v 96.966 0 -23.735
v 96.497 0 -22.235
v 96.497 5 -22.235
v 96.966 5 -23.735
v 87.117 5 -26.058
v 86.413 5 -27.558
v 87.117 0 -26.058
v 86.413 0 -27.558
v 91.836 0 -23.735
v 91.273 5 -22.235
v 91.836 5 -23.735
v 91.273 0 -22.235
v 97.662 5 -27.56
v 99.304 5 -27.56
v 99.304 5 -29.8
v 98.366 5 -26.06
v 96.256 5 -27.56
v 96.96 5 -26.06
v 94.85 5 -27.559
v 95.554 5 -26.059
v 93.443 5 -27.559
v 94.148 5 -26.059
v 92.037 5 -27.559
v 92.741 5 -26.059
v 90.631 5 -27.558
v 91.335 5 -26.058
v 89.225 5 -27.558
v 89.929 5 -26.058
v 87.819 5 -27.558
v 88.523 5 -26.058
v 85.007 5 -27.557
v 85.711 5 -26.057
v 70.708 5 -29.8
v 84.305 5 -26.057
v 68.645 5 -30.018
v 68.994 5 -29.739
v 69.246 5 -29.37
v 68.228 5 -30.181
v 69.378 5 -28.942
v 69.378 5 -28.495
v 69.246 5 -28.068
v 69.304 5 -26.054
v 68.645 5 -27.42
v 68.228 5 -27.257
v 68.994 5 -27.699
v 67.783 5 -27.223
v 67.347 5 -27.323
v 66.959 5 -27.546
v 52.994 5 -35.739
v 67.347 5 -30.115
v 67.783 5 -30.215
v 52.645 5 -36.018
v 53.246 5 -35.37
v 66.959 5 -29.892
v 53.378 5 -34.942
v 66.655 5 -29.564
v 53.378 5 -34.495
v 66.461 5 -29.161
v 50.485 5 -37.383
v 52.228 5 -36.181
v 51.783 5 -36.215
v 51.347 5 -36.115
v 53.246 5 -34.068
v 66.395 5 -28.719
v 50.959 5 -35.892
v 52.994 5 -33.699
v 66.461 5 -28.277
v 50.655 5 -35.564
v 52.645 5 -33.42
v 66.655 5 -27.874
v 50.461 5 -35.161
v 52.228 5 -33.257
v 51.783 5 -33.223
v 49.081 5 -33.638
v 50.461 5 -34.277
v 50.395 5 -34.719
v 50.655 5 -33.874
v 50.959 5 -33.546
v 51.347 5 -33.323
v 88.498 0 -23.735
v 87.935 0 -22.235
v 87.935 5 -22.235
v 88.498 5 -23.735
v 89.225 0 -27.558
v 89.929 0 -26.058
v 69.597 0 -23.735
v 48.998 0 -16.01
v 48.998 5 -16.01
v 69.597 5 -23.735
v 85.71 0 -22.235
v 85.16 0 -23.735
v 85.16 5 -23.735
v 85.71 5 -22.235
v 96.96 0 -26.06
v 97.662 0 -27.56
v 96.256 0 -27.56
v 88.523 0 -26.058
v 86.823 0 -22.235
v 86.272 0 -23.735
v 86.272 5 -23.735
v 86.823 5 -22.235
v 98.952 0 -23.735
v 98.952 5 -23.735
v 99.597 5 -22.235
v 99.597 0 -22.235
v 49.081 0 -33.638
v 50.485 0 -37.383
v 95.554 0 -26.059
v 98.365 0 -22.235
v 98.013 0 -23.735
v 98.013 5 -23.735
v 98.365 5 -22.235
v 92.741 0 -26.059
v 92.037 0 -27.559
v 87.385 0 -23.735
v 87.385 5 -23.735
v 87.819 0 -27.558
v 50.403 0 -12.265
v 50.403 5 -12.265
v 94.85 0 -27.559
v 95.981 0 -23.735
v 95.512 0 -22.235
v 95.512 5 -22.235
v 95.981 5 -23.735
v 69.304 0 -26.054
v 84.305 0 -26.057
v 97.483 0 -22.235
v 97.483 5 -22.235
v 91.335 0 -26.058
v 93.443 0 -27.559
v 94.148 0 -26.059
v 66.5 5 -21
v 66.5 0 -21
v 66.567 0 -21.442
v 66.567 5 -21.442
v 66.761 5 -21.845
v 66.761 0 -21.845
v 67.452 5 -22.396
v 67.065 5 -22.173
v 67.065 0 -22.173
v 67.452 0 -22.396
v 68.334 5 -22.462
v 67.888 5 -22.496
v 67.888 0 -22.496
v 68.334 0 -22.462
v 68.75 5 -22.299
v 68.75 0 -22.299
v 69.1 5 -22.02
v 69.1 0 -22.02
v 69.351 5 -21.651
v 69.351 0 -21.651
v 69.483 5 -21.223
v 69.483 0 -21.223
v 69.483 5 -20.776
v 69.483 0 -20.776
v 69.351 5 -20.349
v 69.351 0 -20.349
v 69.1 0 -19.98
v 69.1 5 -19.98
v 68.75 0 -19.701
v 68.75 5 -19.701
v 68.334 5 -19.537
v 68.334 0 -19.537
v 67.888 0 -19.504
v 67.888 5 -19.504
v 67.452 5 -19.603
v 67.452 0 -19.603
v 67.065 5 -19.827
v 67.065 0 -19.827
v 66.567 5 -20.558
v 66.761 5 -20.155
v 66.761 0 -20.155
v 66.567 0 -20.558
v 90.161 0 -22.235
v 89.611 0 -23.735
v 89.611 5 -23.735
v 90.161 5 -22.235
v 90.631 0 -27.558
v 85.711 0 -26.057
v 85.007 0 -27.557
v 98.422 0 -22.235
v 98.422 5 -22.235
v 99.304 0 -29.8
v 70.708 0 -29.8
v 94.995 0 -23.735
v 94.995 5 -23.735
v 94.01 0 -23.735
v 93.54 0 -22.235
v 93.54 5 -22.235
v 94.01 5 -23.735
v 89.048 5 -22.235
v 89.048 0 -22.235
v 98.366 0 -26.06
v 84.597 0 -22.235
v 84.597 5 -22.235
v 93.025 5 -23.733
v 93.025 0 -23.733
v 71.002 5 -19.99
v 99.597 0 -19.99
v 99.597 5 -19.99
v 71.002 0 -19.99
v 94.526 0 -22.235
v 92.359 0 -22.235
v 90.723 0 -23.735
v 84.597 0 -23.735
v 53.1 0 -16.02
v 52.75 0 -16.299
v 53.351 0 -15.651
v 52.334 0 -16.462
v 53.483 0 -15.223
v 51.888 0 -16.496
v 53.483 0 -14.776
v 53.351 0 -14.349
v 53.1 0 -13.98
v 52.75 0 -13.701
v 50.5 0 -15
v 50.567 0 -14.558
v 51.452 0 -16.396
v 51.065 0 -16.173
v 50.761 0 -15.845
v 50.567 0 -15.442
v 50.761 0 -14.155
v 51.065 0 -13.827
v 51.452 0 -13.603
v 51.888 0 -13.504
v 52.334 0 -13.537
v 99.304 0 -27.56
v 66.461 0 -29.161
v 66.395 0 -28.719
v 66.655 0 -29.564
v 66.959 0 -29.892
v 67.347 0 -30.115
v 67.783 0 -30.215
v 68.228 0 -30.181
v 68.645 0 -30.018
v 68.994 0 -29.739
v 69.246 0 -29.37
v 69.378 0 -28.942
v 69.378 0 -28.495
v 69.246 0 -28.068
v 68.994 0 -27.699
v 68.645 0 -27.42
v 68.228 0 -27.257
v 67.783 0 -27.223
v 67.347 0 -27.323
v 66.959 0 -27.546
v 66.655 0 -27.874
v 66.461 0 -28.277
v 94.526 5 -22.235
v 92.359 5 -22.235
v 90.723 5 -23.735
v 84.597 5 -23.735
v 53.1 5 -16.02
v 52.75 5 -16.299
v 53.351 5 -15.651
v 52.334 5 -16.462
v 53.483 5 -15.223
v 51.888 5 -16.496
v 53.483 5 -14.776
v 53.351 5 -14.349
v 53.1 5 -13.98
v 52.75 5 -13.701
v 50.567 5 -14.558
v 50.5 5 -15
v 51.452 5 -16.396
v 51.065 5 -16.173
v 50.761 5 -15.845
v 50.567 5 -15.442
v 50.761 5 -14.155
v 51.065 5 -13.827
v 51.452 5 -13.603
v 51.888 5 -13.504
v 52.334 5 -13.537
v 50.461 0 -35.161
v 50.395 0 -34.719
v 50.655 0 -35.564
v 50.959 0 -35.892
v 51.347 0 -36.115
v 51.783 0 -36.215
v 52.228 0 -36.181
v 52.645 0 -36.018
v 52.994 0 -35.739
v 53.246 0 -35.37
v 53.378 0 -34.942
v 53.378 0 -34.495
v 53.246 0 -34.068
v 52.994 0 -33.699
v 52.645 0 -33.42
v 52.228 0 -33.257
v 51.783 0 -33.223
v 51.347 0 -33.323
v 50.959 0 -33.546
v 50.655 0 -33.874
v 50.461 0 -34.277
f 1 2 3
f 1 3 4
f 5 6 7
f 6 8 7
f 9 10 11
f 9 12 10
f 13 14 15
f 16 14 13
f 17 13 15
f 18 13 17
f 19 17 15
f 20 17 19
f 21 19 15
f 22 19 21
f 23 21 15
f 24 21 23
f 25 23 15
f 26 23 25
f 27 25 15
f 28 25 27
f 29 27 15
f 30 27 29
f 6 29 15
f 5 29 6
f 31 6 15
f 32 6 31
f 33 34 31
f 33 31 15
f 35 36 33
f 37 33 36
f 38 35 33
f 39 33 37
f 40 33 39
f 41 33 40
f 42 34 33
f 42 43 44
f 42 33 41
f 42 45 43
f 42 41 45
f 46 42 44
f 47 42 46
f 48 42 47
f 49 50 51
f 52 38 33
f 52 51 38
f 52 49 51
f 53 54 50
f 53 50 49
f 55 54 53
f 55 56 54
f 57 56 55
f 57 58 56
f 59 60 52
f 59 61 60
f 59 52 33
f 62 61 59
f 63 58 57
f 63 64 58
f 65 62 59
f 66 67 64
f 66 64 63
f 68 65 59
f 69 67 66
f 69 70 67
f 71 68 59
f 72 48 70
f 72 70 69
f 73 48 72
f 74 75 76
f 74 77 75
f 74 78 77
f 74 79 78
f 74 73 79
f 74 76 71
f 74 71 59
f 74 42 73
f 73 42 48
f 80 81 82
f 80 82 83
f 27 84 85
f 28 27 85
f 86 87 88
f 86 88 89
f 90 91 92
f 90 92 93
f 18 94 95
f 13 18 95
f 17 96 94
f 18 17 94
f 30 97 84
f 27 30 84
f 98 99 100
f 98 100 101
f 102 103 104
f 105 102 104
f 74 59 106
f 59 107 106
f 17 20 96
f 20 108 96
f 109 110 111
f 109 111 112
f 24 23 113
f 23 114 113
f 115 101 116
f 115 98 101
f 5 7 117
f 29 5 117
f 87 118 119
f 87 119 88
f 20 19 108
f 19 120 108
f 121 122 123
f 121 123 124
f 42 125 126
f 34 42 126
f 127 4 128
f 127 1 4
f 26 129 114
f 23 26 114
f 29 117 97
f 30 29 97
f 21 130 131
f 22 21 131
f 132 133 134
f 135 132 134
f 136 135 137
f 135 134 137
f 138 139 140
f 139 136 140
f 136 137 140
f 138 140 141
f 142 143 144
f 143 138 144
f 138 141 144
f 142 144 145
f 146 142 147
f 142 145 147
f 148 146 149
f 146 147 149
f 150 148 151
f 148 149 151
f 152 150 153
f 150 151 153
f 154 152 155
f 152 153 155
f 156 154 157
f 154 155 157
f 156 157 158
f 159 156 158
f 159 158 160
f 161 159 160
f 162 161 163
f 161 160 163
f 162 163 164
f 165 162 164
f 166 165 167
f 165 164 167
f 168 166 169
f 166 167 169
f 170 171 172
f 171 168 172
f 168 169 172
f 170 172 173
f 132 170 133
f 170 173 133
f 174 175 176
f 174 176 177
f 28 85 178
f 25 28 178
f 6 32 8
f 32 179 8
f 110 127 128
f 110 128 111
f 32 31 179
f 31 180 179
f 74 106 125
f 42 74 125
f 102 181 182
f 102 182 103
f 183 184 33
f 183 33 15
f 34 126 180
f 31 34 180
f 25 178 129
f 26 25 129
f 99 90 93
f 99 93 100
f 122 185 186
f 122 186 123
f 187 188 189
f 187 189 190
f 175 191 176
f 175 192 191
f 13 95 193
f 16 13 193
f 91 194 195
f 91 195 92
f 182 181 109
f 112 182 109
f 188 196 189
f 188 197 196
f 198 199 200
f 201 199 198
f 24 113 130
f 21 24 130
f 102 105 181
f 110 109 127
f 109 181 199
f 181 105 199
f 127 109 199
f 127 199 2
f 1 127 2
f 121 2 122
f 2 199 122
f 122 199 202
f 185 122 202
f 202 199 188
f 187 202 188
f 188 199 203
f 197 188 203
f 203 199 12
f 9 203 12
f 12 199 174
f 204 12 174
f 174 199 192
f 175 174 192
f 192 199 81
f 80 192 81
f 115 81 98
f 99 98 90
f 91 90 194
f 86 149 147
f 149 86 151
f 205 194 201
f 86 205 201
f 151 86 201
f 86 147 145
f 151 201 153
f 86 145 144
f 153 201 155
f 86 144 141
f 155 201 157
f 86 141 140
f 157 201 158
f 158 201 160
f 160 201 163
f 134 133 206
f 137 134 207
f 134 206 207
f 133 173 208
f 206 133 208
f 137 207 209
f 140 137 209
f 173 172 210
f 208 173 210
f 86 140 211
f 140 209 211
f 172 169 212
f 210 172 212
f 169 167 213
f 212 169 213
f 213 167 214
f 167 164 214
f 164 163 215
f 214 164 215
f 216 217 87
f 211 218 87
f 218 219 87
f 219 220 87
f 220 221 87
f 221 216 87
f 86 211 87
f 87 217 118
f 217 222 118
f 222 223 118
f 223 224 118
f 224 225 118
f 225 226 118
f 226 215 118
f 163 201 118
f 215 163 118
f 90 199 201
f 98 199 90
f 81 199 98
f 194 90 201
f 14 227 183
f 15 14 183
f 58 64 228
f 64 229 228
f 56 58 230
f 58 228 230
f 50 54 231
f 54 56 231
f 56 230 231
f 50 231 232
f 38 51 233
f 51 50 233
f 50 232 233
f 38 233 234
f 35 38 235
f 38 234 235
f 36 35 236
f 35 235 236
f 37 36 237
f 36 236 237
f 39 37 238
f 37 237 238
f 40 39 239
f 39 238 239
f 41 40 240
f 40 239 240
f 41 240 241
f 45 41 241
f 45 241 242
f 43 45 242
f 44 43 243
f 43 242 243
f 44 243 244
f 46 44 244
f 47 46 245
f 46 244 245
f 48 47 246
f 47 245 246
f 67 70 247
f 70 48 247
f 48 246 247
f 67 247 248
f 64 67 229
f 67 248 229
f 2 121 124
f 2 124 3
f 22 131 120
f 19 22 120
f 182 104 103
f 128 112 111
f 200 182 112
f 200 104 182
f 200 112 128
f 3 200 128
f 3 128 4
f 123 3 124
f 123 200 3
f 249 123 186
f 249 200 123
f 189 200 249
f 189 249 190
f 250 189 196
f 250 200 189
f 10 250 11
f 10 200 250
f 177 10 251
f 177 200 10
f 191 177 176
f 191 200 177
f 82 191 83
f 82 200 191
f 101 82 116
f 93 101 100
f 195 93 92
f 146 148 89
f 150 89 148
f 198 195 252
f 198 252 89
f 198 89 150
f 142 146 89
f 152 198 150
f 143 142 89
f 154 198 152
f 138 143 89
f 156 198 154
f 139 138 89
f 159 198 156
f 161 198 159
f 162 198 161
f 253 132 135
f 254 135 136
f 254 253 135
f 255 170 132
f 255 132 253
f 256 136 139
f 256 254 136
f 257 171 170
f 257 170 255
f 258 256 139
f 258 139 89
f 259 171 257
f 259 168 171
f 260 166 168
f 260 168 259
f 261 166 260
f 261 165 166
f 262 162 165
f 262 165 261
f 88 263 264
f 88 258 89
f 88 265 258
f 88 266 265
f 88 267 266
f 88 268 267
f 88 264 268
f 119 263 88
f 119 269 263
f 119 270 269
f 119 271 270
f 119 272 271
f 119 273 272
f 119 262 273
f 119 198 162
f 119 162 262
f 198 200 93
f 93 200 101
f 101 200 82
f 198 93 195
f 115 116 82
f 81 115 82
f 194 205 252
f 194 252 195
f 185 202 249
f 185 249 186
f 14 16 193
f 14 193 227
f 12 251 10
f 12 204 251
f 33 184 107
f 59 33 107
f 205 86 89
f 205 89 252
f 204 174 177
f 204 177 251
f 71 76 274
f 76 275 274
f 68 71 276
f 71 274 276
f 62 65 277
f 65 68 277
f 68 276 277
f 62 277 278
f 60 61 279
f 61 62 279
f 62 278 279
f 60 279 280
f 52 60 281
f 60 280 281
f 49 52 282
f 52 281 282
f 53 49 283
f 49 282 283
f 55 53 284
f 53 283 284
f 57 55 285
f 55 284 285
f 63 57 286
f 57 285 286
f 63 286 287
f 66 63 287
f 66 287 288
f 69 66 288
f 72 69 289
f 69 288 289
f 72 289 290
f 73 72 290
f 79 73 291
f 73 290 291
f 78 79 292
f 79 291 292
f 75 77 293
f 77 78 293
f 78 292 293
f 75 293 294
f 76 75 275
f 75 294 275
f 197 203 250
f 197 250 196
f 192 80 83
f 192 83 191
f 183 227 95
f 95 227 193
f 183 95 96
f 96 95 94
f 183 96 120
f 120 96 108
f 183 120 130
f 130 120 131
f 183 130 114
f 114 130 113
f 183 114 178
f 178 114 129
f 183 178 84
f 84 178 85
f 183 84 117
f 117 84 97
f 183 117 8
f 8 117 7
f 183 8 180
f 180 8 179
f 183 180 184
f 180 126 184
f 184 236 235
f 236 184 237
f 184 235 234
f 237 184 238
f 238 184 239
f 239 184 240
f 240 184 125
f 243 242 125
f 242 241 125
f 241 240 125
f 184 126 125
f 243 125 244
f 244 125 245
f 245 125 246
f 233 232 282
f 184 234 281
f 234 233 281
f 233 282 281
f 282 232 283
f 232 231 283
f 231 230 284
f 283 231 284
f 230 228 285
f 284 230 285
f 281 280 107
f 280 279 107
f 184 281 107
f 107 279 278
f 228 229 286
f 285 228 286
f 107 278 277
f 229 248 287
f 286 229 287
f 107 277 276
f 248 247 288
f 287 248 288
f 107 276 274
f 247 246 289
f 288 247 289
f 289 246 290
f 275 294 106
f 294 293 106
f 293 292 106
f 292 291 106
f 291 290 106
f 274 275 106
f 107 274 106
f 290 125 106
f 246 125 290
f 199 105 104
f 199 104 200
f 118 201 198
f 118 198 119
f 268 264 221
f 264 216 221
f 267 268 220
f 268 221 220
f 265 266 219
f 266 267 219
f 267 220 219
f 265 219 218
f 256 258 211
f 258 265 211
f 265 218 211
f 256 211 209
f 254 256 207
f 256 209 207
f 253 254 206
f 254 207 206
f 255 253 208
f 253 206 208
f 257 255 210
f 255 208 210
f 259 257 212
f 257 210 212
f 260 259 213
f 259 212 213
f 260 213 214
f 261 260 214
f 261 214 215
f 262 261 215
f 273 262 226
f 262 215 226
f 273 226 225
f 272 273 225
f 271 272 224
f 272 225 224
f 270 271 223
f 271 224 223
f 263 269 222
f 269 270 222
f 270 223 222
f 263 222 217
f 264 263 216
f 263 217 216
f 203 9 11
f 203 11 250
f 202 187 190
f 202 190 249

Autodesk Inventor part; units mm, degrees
ref_plane "YZ Plane" through (0, 0, 0) normal (1, 0, 0) x (0, 1, 0)
ref_plane "XZ Plane" through (0, 0, 0) normal (0, 1, 0) x (-1, 0, 0)
ref_plane "XY Plane" through (0, 0, 0) normal (0, 0, 1) x (1, 0, 0)
sketch "Sketch1" plane through (0, 0, 0) normal (0, 1, 0) x (-1, 0, 0)
  line L0 (-55, -17.4998) -> (-55, -12.4998)
  line L1 (-55, -37.4998) -> (-55, -32.4998)
  circle A0 centre (-51.8947, -34.7189) radius 1.5
  circle A1 centre (-67.8947, -28.7189) radius 1.5
  circle A2 centre (-68, -20.9998) radius 1.5
  circle A3 centre (-52, -14.9998) radius 1.5
  line L2 (-49.0809, -33.638) -> (-69.3039, -26.0544)
  line L3 (-70.7084, -29.7997) -> (-50.4854, -37.3833)
  line L4 (-50.4854, -37.3833) -> (-49.0809, -33.638)
  line L5 (-49.0809, -33.638) -> (-70.7084, -29.7997) construction
  line L6 (-69.3039, -26.0544) -> (-50.4854, -37.3833) construction
  line L7 (-48.9981, -16.0101) -> (-69.5974, -23.7348)
  line L8 (-71.0019, -19.9895) -> (-50.4026, -12.2648)
  line L9 (-50.4026, -12.2648) -> (-48.9981, -16.0101)
  line L10 (-48.9981, -16.0101) -> (-71.0019, -19.9895) construction
  line L11 (-69.5974, -23.7348) -> (-50.4026, -12.2648) construction
  line L12 (-99.5974, -19.9895) -> (-71.0019, -19.9895)
  line L13 (-84.3047, -26.0571) -> (-85.0066, -27.5572)
  line L14 (-85.0066, -27.5572) -> (-85.7108, -26.0574)
  line L15 (-85.7108, -26.0574) -> (-86.4127, -27.5575)
  line L16 (-86.4127, -27.5575) -> (-87.1169, -26.0577)
  line L17 (-87.1169, -26.0577) -> (-87.8189, -27.5578)
  line L18 (-87.8189, -27.5578) -> (-88.523, -26.0579)
  line L19 (-88.523, -26.0579) -> (-89.225, -27.5581)
  line L20 (-89.225, -27.5581) -> (-89.9292, -26.0582)
  line L21 (-89.9292, -26.0582) -> (-90.6311, -27.5584)
  line L22 (-90.6311, -27.5584) -> (-91.3353, -26.0585)
  line L23 (-91.3353, -26.0585) -> (-92.0372, -27.5586)
  line L24 (-92.0372, -27.5586) -> (-92.7414, -26.0588)
  line L25 (-92.7414, -26.0588) -> (-93.4434, -27.5589)
  line L26 (-93.4434, -27.5589) -> (-94.1475, -26.059)
  line L27 (-94.1475, -26.059) -> (-94.8495, -27.5592)
  line L28 (-94.8495, -27.5592) -> (-95.5537, -26.0593)
  line L29 (-95.5537, -26.0593) -> (-96.2556, -27.5595)
  line L30 (-96.2556, -27.5595) -> (-96.9598, -26.0596)
  line L31 (-96.9598, -26.0596) -> (-97.6617, -27.5597)
  line L32 (-97.6617, -27.5597) -> (-98.3659, -26.0599)
  line L33 (-98.3659, -26.0599) -> (-99.3044, -27.5601)
  line L34 (-69.3039, -26.0544) -> (-84.3047, -26.0571)
  line L35 (-84.5974, -23.7348) -> (-84.5974, -22.2348)
  line L36 (-84.5974, -22.2348) -> (-85.1599, -23.7348)
  line L37 (-85.1599, -23.7348) -> (-85.71, -22.2348)
  line L38 (-85.71, -22.2348) -> (-86.2725, -23.7348)
  line L39 (-86.2725, -23.7348) -> (-86.8227, -22.2348)
  line L40 (-86.8227, -22.2348) -> (-87.3852, -23.7348)
  line L41 (-87.3852, -23.7348) -> (-87.9354, -22.2348)
  line L42 (-87.9354, -22.2348) -> (-88.4979, -23.7348)
  line L43 (-88.4979, -23.7348) -> (-89.0481, -22.2348)
  line L44 (-89.0481, -22.2348) -> (-89.6106, -23.7348)
  line L45 (-89.6106, -23.7348) -> (-90.1607, -22.2348)
  line L46 (-90.1607, -22.2348) -> (-90.7232, -23.7348)
  line L47 (-90.7232, -23.7348) -> (-91.2734, -22.2348)
  line L48 (-91.2734, -22.2348) -> (-91.8359, -23.7348)
  line L49 (-91.8359, -23.7348) -> (-92.3586, -22.2348)
  line L50 (-92.3586, -22.2348) -> (-93.0246, -23.7333)
  line L51 (-93.0246, -23.7333) -> (-93.5404, -22.2348)
  line L52 (-93.5404, -22.2348) -> (-94.0097, -23.7348)
  line L53 (-94.0097, -23.7348) -> (-94.526, -22.2348)
  line L54 (-94.526, -22.2348) -> (-94.9953, -23.7348)
  line L55 (-94.9953, -23.7348) -> (-95.5116, -22.2348)
  line L56 (-95.5116, -22.2348) -> (-95.9809, -23.7348)
  line L57 (-95.9809, -23.7348) -> (-96.4972, -22.2348)
  line L58 (-96.4972, -22.2348) -> (-96.9665, -23.7348)
  line L59 (-96.9665, -23.7348) -> (-97.4828, -22.2348)
  line L60 (-97.4828, -22.2348) -> (-98.0132, -23.7348)
  line L61 (-98.0132, -23.7348) -> (-98.3652, -22.2348)
  line L62 (-98.4221, -22.2348) -> (-98.9525, -23.7348)
  line L63 (-98.9525, -23.7348) -> (-99.5974, -22.2348)
  line L64 (-69.5974, -23.7348) -> (-84.5974, -23.7348)
  line L65 (-99.5974, -22.2348) -> (-99.5974, -19.9895)
  line L66 (-99.3044, -27.5601) -> (-99.3039, -29.7997)
  line L67 (-98.4221, -22.2348) -> (-98.3652, -22.2348)
  line L68 (-70.7084, -29.7997) -> (-99.3039, -29.7997)
  point P0 (0, 0)
  point P1 (-59.8947, -31.7189)
  point P2 (-60, -17.9998)
  dimension "d22" = 3
  dimension "d23" = 3
  dimension "d24" = 3
  dimension "d25" = 4
  dimension "d26" = 22
  dimension "d27" = 4
  dimension "d33" = 1.5
extrude "Extrusion1" add sketch "Sketch1" along normal blind 5
properties part number "chwytakzabkikoncowka"
